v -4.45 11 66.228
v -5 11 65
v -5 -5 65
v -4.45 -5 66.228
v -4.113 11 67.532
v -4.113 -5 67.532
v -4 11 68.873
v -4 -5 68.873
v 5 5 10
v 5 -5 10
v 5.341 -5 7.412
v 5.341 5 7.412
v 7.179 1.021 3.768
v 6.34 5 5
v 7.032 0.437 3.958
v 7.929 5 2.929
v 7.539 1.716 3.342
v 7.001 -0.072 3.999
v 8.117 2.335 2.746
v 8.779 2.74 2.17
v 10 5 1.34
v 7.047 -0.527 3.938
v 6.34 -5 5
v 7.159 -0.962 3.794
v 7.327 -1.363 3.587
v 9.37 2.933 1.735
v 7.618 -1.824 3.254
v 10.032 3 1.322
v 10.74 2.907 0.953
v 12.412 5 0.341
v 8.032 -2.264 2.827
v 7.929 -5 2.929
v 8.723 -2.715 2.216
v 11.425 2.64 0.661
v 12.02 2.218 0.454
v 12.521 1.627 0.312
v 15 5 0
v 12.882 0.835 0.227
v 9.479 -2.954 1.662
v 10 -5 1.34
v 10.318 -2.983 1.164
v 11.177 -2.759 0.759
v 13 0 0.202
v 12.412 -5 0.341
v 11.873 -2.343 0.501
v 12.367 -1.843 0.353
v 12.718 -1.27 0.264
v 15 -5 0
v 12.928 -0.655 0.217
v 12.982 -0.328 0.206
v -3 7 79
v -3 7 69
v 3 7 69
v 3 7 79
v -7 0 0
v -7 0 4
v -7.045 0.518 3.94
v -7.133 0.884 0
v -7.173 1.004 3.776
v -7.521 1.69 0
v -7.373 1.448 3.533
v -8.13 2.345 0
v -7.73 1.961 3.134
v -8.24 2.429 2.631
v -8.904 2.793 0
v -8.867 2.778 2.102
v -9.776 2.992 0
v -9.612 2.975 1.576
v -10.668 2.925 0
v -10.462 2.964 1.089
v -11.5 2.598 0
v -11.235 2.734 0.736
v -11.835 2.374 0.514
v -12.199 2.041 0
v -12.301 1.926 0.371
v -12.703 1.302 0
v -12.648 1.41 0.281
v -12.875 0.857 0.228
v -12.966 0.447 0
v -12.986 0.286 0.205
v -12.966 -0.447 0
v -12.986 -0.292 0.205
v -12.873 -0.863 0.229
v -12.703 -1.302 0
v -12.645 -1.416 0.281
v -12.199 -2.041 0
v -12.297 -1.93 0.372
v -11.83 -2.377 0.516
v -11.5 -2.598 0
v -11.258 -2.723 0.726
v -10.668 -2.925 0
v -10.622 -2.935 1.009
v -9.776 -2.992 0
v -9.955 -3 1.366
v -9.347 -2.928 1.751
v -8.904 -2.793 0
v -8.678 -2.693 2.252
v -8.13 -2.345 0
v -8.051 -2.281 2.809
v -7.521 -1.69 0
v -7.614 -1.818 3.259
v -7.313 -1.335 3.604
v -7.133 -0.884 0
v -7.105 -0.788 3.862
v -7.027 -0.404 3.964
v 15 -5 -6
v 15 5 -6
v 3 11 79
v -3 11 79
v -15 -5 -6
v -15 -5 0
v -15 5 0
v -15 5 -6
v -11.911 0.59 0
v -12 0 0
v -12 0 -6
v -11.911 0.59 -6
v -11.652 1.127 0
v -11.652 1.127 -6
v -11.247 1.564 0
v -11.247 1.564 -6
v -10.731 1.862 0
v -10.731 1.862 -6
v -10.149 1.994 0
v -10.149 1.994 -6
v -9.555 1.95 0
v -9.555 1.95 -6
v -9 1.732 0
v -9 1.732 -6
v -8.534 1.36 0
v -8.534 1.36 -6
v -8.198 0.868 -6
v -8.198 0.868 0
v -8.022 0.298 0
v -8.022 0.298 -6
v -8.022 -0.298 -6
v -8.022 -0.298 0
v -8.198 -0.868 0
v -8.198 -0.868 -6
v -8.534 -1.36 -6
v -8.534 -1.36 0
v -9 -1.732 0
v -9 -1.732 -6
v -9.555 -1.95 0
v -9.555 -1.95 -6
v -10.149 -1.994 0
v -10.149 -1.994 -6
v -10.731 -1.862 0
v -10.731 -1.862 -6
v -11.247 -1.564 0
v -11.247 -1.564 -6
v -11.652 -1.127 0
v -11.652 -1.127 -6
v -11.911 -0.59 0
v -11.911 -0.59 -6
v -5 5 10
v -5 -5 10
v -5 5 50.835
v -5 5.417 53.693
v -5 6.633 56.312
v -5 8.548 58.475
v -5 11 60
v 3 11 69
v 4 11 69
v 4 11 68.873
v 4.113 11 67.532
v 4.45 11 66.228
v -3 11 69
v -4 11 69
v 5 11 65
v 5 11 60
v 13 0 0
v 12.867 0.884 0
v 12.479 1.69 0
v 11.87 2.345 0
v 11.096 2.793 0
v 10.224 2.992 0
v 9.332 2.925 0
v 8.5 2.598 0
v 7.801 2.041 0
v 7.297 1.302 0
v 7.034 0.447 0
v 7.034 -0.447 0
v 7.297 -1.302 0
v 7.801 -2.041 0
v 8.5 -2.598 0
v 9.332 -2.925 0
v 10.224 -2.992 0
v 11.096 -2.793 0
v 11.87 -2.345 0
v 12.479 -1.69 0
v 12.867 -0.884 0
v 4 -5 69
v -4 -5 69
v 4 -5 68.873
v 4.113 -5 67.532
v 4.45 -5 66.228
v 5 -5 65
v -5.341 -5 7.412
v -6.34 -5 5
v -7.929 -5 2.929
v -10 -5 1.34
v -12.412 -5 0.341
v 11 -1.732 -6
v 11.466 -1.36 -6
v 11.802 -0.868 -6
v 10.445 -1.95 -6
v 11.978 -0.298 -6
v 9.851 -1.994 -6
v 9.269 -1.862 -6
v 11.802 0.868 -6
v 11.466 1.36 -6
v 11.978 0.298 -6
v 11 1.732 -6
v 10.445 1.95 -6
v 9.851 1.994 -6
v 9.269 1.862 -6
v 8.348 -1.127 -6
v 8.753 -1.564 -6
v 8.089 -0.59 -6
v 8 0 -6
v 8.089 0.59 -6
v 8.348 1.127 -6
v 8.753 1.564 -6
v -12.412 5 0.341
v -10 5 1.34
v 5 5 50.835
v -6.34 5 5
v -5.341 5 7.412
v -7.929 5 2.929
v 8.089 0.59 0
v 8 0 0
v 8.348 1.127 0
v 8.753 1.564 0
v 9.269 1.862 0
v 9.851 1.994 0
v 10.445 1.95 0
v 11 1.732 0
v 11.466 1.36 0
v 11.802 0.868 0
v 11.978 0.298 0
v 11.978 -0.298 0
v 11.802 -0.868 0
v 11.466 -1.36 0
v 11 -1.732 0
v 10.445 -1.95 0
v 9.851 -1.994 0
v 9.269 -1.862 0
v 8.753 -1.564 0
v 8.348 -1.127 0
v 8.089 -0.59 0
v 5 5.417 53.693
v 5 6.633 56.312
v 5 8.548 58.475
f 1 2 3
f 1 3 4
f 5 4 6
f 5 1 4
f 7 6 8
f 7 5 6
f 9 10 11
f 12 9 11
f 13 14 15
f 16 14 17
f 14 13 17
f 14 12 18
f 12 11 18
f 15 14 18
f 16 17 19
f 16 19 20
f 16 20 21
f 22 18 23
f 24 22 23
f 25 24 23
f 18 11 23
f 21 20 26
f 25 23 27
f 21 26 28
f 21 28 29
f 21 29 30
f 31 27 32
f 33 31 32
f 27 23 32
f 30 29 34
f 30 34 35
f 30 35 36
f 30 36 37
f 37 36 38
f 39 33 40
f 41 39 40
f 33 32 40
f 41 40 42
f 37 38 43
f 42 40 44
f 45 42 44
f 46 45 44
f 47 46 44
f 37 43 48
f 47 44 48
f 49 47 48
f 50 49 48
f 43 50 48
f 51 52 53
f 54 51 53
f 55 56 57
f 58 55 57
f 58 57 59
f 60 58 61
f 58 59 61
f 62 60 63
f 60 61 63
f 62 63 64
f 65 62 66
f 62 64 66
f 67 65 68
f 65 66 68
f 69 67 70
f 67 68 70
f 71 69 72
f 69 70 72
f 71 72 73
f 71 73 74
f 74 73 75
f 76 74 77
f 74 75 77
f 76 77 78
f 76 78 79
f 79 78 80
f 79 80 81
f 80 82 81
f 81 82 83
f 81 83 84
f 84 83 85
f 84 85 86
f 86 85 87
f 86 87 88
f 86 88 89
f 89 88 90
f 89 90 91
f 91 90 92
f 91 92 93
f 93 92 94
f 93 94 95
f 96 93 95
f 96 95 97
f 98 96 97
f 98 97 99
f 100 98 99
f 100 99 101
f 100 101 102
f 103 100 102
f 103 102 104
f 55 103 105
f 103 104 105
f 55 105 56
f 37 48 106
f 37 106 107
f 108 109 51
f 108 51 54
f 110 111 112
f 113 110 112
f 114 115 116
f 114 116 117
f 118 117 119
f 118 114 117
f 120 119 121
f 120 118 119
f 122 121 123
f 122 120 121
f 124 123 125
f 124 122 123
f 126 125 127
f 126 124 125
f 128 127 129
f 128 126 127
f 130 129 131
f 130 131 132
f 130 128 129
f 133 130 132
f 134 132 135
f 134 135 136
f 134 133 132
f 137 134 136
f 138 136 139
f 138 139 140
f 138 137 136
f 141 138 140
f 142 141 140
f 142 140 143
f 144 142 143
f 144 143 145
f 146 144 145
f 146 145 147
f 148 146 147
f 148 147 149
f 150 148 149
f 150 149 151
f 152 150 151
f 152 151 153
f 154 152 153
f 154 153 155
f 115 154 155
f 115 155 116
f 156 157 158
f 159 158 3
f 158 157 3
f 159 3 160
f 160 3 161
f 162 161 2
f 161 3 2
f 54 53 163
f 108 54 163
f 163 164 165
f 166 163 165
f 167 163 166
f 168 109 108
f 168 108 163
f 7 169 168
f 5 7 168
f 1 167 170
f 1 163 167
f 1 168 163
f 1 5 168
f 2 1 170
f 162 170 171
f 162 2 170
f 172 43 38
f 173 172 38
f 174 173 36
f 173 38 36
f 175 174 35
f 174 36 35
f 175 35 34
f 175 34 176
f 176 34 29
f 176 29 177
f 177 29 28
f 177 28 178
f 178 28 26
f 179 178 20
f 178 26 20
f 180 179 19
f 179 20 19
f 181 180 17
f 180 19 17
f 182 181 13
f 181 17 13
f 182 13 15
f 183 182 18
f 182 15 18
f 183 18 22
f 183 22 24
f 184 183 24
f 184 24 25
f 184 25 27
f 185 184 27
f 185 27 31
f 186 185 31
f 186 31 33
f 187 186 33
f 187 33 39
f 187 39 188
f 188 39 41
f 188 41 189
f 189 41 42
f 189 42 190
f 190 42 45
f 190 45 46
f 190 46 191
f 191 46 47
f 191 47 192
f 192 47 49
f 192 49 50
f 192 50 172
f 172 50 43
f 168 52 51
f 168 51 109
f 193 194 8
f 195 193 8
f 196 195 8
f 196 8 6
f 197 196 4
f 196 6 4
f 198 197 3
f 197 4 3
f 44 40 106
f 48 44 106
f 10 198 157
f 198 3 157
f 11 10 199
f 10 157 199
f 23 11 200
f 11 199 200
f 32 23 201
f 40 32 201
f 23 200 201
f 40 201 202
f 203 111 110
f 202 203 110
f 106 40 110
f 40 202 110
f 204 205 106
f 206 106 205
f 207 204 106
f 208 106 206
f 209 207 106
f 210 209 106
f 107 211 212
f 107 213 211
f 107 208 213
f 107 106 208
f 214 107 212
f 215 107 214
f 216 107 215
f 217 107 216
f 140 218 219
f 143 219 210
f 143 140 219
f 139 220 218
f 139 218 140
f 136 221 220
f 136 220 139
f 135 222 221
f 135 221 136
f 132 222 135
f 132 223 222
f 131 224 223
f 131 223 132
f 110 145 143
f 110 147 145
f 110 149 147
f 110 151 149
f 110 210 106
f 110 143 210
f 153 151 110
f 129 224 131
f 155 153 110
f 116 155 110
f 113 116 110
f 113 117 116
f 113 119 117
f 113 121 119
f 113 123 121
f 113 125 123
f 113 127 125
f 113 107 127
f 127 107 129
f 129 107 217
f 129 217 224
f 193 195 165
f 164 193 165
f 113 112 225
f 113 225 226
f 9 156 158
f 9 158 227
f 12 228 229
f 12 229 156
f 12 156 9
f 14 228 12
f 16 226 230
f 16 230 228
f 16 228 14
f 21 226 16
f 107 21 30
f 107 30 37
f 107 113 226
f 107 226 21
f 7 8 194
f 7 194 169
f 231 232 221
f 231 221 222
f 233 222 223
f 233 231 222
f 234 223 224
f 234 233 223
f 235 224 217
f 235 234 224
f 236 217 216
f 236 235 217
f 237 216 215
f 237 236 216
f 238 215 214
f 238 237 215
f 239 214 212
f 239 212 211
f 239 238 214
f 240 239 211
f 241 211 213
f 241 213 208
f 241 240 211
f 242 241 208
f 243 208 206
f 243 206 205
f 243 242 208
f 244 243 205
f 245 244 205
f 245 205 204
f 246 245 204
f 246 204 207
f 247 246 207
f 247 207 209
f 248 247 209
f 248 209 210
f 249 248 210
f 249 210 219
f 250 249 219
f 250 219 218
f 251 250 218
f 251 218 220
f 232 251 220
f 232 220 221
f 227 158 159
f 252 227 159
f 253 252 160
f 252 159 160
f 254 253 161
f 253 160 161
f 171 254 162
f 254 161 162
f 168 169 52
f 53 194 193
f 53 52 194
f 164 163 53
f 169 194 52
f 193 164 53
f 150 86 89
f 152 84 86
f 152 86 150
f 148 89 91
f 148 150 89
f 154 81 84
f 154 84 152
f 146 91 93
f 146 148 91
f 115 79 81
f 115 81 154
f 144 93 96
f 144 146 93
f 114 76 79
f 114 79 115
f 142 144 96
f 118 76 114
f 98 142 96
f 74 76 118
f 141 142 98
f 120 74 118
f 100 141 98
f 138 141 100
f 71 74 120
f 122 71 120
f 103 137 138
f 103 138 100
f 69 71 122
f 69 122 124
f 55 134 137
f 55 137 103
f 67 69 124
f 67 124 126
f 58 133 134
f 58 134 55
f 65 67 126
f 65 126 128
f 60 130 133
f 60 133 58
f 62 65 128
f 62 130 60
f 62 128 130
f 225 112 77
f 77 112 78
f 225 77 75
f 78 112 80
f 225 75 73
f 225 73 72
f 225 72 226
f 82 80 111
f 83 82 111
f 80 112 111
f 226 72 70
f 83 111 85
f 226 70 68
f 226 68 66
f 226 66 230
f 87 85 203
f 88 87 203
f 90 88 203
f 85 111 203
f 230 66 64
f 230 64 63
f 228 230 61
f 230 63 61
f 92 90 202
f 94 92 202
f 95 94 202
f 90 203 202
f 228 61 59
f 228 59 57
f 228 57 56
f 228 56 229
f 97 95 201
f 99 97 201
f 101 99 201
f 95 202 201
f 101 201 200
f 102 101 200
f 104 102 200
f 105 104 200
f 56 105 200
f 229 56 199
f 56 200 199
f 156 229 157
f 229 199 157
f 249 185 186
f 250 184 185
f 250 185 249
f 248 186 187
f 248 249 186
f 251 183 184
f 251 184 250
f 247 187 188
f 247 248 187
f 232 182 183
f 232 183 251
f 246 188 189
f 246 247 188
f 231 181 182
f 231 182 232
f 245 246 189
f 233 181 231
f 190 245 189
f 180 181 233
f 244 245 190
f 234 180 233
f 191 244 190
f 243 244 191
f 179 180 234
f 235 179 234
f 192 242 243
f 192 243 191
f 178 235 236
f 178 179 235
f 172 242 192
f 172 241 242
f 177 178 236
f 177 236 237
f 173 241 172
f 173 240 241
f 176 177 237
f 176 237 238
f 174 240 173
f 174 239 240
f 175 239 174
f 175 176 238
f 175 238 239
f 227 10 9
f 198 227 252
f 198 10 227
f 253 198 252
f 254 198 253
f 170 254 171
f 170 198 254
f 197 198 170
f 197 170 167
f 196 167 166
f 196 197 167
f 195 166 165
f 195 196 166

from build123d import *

# Parameters (mm, degrees)
SKETCH1_W           = 10
SKETCH1_H           = 10
BOSS_EXTRUDE1_DEPTH = 65
SKETCH2_W           = 30
SKETCH2_H           = 10
SKETCH2_R           = 2
BOSS_EXTRUDE2_DEPTH = 6
SKETCH3_W           = 10
SKETCH3_H           = 5
BOSS_EXTRUDE3_DEPTH = 6
SKETCH4_W           = 8
SKETCH4_H           = 16
BOSS_EXTRUDE4_DEPTH = 4
SKETCH5_W           = 6
SKETCH5_H           = 4
BOSS_EXTRUDE5_DEPTH = 10
FILLET1_START       = 2.0000001
FILLET1_DEPTH       = 2.9999999
FILLET1_START_2     = -5
FILLET1_2_DEPTH     = 2.999999286
FILLET1_START_3     = -2.000000714
FILLET1_3_DEPTH     = 4.000000814
FILLET1_4_DEPTH     = 10
FILLET1_5_OUTLINE_R = 2
FILLET1_5_DEPTH     = 11
SKETCH6_R           = 3
CUT_EXTRUDE1_DEPTH  = 69
FILLET2_R           = 8


with BuildPart() as part:
    # Sketch1 → Boss-Extrude1 (new body)
    with BuildSketch(Plane.XY):
        Rectangle(SKETCH1_W, SKETCH1_H)
    extrude(amount=BOSS_EXTRUDE1_DEPTH)

    # Sketch2 → Boss-Extrude2 (add)
    with BuildSketch(Plane(origin=(0, 0, 0), x_dir=(-1, 0, 0), z_dir=(0, 0, -1))):
        Rectangle(SKETCH2_W, SKETCH2_H)
        with Locations((-10, 0)):
            Circle(SKETCH2_R, mode=Mode.SUBTRACT)
        with Locations((10, 0)):
            Circle(SKETCH2_R, mode=Mode.SUBTRACT)
    extrude(amount=BOSS_EXTRUDE2_DEPTH)

    # Sketch3 → Boss-Extrude3 (add)
    with BuildSketch(Plane(origin=(0, 5, 0), x_dir=(1, 0, 0), z_dir=(0, 1, 0))):
        with Locations((0, -62.5)):
            Rectangle(SKETCH3_W, SKETCH3_H)
    extrude(amount=BOSS_EXTRUDE3_DEPTH)

    # Sketch4 → Boss-Extrude4 (add)
    with BuildSketch(Plane.XY.offset(65)):
        with Locations((0, 3)):
            Rectangle(SKETCH4_W, SKETCH4_H)
    extrude(amount=BOSS_EXTRUDE4_DEPTH)

    # Sketch5 → Boss-Extrude5 (add)
    with BuildSketch(Plane.XY.offset(69)):
        with Locations((0, 9)):
            Rectangle(SKETCH5_W, SKETCH5_H)
    extrude(amount=BOSS_EXTRUDE5_DEPTH)

    # Fillet1: read off the stored shape, not the designer's step
    # Fillet1 outline → Fillet1 (add)
    with BuildSketch(Plane(origin=(0, 0, 0), x_dir=(1, 0, 0), z_dir=(0, 1, 0)).offset(FILLET1_START)):
        with BuildLine():
            ThreePointArc((-15, 0), (-7.928932188, -2.928932188), (-5, -10))
            Line((-5, -10), (-5, 0))
            Line((-5, 0), (-15, 0))
        make_face()
        with BuildLine():
            Line((5, 0), (5, -10))
            ThreePointArc((5, -10), (7.928932188, -2.928932188), (15, 0))
            Line((15, 0), (5, 0))
        make_face()
    extrude(amount=FILLET1_DEPTH)

    # Fillet1 2 outline → Fillet1 2 (add)
    with BuildSketch(Plane(origin=(0, 0, 0), x_dir=(1, 0, 0), z_dir=(0, 1, 0)).offset(FILLET1_START_2)):
        with BuildLine():
            ThreePointArc((-15, 0), (-7.928932188, -2.928932188), (-5, -10))
            Line((-5, -10), (-5, 0))
            Line((-5, 0), (-15, 0))
        make_face()
        with BuildLine():
            Line((5, 0), (5, -10))
            ThreePointArc((5, -10), (7.928932188, -2.928932188), (15, 0))
            Line((15, 0), (5, 0))
        make_face()
    extrude(amount=FILLET1_2_DEPTH)

    # Fillet1 3 outline → Fillet1 3 (add)
    with BuildSketch(Plane(origin=(0, 0, 0), x_dir=(1, 0, 0), z_dir=(0, 1, 0)).offset(FILLET1_START_3)):
        with BuildLine():
            ThreePointArc((-15, 0), (-7.928932188, -2.928932188), (-5, -10))
            Line((-5, -10), (-5, 0))
            Line((-5, 0), (-15, 0))
        make_face()
        with BuildLine():
            Line((5, 0), (5, -10))
            ThreePointArc((5, -10), (7.928932188, -2.928932188), (15, 0))
            Line((15, 0), (5, 0))
        make_face()
    extrude(amount=FILLET1_3_DEPTH)

    # Fillet1 4 outline → Fillet1 4 (add)
    with BuildSketch(Plane.YZ.offset(FILLET1_START_2)):
        with BuildLine():
            ThreePointArc((5, 50.83484861), (6.633399735, 56.312074185), (11, 60))
            Line((11, 60), (5, 60))
            Line((5, 60), (5, 50.83484861))
        make_face()
    extrude(amount=FILLET1_4_DEPTH)

    # Fillet1 5 outline → Fillet1 5 (cut)
    with BuildSketch(Plane.XY):
        with Locations((10, 0)):
            Circle(FILLET1_5_OUTLINE_R)
        with Locations((-10, 0)):
            Circle(FILLET1_5_OUTLINE_R)
    extrude(amount=FILLET1_5_DEPTH, mode=Mode.SUBTRACT)

    # Sketch6 → Cut-Extrude1 (cut)
    with BuildSketch(Plane.XY.offset(69)):
        with Locations((-10, 0)):
            Circle(SKETCH6_R)
        with Locations((10, 0)):
            Circle(SKETCH6_R)
    extrude(amount=-CUT_EXTRUDE1_DEPTH, mode=Mode.SUBTRACT)

    # Fillet2
    # the kernel refuses this fillet: 8 mm, written as the material it adds along each edge
    with BuildSketch(Plane(origin=(4, -5, 65), x_dir=(1, 0, 0), z_dir=(0, 1, 0))) as fillet2_piece_1:
        with BuildLine():
            CenterArc((8, -3.872983346), FILLET2_R, 151.044975628, 28.955024372)
            Line((0, -3.872983346), (0, 0))
            Line((0, 0), (1, 0))
        make_face()
    extrude(amount=16)
    with BuildSketch(Plane(origin=(-4, 11, 65), x_dir=(0, 0, 1), z_dir=(0, -1, 0))) as fillet2_piece_2:
        with BuildLine():
            CenterArc((3.872983346, 8), FILLET2_R, 241.044975628, 28.955024372)
            Line((0, 1), (0, 0))
            Line((0, 0), (3.872983346, 0))
        make_face()
    extrude(amount=16)


solid = part.part
